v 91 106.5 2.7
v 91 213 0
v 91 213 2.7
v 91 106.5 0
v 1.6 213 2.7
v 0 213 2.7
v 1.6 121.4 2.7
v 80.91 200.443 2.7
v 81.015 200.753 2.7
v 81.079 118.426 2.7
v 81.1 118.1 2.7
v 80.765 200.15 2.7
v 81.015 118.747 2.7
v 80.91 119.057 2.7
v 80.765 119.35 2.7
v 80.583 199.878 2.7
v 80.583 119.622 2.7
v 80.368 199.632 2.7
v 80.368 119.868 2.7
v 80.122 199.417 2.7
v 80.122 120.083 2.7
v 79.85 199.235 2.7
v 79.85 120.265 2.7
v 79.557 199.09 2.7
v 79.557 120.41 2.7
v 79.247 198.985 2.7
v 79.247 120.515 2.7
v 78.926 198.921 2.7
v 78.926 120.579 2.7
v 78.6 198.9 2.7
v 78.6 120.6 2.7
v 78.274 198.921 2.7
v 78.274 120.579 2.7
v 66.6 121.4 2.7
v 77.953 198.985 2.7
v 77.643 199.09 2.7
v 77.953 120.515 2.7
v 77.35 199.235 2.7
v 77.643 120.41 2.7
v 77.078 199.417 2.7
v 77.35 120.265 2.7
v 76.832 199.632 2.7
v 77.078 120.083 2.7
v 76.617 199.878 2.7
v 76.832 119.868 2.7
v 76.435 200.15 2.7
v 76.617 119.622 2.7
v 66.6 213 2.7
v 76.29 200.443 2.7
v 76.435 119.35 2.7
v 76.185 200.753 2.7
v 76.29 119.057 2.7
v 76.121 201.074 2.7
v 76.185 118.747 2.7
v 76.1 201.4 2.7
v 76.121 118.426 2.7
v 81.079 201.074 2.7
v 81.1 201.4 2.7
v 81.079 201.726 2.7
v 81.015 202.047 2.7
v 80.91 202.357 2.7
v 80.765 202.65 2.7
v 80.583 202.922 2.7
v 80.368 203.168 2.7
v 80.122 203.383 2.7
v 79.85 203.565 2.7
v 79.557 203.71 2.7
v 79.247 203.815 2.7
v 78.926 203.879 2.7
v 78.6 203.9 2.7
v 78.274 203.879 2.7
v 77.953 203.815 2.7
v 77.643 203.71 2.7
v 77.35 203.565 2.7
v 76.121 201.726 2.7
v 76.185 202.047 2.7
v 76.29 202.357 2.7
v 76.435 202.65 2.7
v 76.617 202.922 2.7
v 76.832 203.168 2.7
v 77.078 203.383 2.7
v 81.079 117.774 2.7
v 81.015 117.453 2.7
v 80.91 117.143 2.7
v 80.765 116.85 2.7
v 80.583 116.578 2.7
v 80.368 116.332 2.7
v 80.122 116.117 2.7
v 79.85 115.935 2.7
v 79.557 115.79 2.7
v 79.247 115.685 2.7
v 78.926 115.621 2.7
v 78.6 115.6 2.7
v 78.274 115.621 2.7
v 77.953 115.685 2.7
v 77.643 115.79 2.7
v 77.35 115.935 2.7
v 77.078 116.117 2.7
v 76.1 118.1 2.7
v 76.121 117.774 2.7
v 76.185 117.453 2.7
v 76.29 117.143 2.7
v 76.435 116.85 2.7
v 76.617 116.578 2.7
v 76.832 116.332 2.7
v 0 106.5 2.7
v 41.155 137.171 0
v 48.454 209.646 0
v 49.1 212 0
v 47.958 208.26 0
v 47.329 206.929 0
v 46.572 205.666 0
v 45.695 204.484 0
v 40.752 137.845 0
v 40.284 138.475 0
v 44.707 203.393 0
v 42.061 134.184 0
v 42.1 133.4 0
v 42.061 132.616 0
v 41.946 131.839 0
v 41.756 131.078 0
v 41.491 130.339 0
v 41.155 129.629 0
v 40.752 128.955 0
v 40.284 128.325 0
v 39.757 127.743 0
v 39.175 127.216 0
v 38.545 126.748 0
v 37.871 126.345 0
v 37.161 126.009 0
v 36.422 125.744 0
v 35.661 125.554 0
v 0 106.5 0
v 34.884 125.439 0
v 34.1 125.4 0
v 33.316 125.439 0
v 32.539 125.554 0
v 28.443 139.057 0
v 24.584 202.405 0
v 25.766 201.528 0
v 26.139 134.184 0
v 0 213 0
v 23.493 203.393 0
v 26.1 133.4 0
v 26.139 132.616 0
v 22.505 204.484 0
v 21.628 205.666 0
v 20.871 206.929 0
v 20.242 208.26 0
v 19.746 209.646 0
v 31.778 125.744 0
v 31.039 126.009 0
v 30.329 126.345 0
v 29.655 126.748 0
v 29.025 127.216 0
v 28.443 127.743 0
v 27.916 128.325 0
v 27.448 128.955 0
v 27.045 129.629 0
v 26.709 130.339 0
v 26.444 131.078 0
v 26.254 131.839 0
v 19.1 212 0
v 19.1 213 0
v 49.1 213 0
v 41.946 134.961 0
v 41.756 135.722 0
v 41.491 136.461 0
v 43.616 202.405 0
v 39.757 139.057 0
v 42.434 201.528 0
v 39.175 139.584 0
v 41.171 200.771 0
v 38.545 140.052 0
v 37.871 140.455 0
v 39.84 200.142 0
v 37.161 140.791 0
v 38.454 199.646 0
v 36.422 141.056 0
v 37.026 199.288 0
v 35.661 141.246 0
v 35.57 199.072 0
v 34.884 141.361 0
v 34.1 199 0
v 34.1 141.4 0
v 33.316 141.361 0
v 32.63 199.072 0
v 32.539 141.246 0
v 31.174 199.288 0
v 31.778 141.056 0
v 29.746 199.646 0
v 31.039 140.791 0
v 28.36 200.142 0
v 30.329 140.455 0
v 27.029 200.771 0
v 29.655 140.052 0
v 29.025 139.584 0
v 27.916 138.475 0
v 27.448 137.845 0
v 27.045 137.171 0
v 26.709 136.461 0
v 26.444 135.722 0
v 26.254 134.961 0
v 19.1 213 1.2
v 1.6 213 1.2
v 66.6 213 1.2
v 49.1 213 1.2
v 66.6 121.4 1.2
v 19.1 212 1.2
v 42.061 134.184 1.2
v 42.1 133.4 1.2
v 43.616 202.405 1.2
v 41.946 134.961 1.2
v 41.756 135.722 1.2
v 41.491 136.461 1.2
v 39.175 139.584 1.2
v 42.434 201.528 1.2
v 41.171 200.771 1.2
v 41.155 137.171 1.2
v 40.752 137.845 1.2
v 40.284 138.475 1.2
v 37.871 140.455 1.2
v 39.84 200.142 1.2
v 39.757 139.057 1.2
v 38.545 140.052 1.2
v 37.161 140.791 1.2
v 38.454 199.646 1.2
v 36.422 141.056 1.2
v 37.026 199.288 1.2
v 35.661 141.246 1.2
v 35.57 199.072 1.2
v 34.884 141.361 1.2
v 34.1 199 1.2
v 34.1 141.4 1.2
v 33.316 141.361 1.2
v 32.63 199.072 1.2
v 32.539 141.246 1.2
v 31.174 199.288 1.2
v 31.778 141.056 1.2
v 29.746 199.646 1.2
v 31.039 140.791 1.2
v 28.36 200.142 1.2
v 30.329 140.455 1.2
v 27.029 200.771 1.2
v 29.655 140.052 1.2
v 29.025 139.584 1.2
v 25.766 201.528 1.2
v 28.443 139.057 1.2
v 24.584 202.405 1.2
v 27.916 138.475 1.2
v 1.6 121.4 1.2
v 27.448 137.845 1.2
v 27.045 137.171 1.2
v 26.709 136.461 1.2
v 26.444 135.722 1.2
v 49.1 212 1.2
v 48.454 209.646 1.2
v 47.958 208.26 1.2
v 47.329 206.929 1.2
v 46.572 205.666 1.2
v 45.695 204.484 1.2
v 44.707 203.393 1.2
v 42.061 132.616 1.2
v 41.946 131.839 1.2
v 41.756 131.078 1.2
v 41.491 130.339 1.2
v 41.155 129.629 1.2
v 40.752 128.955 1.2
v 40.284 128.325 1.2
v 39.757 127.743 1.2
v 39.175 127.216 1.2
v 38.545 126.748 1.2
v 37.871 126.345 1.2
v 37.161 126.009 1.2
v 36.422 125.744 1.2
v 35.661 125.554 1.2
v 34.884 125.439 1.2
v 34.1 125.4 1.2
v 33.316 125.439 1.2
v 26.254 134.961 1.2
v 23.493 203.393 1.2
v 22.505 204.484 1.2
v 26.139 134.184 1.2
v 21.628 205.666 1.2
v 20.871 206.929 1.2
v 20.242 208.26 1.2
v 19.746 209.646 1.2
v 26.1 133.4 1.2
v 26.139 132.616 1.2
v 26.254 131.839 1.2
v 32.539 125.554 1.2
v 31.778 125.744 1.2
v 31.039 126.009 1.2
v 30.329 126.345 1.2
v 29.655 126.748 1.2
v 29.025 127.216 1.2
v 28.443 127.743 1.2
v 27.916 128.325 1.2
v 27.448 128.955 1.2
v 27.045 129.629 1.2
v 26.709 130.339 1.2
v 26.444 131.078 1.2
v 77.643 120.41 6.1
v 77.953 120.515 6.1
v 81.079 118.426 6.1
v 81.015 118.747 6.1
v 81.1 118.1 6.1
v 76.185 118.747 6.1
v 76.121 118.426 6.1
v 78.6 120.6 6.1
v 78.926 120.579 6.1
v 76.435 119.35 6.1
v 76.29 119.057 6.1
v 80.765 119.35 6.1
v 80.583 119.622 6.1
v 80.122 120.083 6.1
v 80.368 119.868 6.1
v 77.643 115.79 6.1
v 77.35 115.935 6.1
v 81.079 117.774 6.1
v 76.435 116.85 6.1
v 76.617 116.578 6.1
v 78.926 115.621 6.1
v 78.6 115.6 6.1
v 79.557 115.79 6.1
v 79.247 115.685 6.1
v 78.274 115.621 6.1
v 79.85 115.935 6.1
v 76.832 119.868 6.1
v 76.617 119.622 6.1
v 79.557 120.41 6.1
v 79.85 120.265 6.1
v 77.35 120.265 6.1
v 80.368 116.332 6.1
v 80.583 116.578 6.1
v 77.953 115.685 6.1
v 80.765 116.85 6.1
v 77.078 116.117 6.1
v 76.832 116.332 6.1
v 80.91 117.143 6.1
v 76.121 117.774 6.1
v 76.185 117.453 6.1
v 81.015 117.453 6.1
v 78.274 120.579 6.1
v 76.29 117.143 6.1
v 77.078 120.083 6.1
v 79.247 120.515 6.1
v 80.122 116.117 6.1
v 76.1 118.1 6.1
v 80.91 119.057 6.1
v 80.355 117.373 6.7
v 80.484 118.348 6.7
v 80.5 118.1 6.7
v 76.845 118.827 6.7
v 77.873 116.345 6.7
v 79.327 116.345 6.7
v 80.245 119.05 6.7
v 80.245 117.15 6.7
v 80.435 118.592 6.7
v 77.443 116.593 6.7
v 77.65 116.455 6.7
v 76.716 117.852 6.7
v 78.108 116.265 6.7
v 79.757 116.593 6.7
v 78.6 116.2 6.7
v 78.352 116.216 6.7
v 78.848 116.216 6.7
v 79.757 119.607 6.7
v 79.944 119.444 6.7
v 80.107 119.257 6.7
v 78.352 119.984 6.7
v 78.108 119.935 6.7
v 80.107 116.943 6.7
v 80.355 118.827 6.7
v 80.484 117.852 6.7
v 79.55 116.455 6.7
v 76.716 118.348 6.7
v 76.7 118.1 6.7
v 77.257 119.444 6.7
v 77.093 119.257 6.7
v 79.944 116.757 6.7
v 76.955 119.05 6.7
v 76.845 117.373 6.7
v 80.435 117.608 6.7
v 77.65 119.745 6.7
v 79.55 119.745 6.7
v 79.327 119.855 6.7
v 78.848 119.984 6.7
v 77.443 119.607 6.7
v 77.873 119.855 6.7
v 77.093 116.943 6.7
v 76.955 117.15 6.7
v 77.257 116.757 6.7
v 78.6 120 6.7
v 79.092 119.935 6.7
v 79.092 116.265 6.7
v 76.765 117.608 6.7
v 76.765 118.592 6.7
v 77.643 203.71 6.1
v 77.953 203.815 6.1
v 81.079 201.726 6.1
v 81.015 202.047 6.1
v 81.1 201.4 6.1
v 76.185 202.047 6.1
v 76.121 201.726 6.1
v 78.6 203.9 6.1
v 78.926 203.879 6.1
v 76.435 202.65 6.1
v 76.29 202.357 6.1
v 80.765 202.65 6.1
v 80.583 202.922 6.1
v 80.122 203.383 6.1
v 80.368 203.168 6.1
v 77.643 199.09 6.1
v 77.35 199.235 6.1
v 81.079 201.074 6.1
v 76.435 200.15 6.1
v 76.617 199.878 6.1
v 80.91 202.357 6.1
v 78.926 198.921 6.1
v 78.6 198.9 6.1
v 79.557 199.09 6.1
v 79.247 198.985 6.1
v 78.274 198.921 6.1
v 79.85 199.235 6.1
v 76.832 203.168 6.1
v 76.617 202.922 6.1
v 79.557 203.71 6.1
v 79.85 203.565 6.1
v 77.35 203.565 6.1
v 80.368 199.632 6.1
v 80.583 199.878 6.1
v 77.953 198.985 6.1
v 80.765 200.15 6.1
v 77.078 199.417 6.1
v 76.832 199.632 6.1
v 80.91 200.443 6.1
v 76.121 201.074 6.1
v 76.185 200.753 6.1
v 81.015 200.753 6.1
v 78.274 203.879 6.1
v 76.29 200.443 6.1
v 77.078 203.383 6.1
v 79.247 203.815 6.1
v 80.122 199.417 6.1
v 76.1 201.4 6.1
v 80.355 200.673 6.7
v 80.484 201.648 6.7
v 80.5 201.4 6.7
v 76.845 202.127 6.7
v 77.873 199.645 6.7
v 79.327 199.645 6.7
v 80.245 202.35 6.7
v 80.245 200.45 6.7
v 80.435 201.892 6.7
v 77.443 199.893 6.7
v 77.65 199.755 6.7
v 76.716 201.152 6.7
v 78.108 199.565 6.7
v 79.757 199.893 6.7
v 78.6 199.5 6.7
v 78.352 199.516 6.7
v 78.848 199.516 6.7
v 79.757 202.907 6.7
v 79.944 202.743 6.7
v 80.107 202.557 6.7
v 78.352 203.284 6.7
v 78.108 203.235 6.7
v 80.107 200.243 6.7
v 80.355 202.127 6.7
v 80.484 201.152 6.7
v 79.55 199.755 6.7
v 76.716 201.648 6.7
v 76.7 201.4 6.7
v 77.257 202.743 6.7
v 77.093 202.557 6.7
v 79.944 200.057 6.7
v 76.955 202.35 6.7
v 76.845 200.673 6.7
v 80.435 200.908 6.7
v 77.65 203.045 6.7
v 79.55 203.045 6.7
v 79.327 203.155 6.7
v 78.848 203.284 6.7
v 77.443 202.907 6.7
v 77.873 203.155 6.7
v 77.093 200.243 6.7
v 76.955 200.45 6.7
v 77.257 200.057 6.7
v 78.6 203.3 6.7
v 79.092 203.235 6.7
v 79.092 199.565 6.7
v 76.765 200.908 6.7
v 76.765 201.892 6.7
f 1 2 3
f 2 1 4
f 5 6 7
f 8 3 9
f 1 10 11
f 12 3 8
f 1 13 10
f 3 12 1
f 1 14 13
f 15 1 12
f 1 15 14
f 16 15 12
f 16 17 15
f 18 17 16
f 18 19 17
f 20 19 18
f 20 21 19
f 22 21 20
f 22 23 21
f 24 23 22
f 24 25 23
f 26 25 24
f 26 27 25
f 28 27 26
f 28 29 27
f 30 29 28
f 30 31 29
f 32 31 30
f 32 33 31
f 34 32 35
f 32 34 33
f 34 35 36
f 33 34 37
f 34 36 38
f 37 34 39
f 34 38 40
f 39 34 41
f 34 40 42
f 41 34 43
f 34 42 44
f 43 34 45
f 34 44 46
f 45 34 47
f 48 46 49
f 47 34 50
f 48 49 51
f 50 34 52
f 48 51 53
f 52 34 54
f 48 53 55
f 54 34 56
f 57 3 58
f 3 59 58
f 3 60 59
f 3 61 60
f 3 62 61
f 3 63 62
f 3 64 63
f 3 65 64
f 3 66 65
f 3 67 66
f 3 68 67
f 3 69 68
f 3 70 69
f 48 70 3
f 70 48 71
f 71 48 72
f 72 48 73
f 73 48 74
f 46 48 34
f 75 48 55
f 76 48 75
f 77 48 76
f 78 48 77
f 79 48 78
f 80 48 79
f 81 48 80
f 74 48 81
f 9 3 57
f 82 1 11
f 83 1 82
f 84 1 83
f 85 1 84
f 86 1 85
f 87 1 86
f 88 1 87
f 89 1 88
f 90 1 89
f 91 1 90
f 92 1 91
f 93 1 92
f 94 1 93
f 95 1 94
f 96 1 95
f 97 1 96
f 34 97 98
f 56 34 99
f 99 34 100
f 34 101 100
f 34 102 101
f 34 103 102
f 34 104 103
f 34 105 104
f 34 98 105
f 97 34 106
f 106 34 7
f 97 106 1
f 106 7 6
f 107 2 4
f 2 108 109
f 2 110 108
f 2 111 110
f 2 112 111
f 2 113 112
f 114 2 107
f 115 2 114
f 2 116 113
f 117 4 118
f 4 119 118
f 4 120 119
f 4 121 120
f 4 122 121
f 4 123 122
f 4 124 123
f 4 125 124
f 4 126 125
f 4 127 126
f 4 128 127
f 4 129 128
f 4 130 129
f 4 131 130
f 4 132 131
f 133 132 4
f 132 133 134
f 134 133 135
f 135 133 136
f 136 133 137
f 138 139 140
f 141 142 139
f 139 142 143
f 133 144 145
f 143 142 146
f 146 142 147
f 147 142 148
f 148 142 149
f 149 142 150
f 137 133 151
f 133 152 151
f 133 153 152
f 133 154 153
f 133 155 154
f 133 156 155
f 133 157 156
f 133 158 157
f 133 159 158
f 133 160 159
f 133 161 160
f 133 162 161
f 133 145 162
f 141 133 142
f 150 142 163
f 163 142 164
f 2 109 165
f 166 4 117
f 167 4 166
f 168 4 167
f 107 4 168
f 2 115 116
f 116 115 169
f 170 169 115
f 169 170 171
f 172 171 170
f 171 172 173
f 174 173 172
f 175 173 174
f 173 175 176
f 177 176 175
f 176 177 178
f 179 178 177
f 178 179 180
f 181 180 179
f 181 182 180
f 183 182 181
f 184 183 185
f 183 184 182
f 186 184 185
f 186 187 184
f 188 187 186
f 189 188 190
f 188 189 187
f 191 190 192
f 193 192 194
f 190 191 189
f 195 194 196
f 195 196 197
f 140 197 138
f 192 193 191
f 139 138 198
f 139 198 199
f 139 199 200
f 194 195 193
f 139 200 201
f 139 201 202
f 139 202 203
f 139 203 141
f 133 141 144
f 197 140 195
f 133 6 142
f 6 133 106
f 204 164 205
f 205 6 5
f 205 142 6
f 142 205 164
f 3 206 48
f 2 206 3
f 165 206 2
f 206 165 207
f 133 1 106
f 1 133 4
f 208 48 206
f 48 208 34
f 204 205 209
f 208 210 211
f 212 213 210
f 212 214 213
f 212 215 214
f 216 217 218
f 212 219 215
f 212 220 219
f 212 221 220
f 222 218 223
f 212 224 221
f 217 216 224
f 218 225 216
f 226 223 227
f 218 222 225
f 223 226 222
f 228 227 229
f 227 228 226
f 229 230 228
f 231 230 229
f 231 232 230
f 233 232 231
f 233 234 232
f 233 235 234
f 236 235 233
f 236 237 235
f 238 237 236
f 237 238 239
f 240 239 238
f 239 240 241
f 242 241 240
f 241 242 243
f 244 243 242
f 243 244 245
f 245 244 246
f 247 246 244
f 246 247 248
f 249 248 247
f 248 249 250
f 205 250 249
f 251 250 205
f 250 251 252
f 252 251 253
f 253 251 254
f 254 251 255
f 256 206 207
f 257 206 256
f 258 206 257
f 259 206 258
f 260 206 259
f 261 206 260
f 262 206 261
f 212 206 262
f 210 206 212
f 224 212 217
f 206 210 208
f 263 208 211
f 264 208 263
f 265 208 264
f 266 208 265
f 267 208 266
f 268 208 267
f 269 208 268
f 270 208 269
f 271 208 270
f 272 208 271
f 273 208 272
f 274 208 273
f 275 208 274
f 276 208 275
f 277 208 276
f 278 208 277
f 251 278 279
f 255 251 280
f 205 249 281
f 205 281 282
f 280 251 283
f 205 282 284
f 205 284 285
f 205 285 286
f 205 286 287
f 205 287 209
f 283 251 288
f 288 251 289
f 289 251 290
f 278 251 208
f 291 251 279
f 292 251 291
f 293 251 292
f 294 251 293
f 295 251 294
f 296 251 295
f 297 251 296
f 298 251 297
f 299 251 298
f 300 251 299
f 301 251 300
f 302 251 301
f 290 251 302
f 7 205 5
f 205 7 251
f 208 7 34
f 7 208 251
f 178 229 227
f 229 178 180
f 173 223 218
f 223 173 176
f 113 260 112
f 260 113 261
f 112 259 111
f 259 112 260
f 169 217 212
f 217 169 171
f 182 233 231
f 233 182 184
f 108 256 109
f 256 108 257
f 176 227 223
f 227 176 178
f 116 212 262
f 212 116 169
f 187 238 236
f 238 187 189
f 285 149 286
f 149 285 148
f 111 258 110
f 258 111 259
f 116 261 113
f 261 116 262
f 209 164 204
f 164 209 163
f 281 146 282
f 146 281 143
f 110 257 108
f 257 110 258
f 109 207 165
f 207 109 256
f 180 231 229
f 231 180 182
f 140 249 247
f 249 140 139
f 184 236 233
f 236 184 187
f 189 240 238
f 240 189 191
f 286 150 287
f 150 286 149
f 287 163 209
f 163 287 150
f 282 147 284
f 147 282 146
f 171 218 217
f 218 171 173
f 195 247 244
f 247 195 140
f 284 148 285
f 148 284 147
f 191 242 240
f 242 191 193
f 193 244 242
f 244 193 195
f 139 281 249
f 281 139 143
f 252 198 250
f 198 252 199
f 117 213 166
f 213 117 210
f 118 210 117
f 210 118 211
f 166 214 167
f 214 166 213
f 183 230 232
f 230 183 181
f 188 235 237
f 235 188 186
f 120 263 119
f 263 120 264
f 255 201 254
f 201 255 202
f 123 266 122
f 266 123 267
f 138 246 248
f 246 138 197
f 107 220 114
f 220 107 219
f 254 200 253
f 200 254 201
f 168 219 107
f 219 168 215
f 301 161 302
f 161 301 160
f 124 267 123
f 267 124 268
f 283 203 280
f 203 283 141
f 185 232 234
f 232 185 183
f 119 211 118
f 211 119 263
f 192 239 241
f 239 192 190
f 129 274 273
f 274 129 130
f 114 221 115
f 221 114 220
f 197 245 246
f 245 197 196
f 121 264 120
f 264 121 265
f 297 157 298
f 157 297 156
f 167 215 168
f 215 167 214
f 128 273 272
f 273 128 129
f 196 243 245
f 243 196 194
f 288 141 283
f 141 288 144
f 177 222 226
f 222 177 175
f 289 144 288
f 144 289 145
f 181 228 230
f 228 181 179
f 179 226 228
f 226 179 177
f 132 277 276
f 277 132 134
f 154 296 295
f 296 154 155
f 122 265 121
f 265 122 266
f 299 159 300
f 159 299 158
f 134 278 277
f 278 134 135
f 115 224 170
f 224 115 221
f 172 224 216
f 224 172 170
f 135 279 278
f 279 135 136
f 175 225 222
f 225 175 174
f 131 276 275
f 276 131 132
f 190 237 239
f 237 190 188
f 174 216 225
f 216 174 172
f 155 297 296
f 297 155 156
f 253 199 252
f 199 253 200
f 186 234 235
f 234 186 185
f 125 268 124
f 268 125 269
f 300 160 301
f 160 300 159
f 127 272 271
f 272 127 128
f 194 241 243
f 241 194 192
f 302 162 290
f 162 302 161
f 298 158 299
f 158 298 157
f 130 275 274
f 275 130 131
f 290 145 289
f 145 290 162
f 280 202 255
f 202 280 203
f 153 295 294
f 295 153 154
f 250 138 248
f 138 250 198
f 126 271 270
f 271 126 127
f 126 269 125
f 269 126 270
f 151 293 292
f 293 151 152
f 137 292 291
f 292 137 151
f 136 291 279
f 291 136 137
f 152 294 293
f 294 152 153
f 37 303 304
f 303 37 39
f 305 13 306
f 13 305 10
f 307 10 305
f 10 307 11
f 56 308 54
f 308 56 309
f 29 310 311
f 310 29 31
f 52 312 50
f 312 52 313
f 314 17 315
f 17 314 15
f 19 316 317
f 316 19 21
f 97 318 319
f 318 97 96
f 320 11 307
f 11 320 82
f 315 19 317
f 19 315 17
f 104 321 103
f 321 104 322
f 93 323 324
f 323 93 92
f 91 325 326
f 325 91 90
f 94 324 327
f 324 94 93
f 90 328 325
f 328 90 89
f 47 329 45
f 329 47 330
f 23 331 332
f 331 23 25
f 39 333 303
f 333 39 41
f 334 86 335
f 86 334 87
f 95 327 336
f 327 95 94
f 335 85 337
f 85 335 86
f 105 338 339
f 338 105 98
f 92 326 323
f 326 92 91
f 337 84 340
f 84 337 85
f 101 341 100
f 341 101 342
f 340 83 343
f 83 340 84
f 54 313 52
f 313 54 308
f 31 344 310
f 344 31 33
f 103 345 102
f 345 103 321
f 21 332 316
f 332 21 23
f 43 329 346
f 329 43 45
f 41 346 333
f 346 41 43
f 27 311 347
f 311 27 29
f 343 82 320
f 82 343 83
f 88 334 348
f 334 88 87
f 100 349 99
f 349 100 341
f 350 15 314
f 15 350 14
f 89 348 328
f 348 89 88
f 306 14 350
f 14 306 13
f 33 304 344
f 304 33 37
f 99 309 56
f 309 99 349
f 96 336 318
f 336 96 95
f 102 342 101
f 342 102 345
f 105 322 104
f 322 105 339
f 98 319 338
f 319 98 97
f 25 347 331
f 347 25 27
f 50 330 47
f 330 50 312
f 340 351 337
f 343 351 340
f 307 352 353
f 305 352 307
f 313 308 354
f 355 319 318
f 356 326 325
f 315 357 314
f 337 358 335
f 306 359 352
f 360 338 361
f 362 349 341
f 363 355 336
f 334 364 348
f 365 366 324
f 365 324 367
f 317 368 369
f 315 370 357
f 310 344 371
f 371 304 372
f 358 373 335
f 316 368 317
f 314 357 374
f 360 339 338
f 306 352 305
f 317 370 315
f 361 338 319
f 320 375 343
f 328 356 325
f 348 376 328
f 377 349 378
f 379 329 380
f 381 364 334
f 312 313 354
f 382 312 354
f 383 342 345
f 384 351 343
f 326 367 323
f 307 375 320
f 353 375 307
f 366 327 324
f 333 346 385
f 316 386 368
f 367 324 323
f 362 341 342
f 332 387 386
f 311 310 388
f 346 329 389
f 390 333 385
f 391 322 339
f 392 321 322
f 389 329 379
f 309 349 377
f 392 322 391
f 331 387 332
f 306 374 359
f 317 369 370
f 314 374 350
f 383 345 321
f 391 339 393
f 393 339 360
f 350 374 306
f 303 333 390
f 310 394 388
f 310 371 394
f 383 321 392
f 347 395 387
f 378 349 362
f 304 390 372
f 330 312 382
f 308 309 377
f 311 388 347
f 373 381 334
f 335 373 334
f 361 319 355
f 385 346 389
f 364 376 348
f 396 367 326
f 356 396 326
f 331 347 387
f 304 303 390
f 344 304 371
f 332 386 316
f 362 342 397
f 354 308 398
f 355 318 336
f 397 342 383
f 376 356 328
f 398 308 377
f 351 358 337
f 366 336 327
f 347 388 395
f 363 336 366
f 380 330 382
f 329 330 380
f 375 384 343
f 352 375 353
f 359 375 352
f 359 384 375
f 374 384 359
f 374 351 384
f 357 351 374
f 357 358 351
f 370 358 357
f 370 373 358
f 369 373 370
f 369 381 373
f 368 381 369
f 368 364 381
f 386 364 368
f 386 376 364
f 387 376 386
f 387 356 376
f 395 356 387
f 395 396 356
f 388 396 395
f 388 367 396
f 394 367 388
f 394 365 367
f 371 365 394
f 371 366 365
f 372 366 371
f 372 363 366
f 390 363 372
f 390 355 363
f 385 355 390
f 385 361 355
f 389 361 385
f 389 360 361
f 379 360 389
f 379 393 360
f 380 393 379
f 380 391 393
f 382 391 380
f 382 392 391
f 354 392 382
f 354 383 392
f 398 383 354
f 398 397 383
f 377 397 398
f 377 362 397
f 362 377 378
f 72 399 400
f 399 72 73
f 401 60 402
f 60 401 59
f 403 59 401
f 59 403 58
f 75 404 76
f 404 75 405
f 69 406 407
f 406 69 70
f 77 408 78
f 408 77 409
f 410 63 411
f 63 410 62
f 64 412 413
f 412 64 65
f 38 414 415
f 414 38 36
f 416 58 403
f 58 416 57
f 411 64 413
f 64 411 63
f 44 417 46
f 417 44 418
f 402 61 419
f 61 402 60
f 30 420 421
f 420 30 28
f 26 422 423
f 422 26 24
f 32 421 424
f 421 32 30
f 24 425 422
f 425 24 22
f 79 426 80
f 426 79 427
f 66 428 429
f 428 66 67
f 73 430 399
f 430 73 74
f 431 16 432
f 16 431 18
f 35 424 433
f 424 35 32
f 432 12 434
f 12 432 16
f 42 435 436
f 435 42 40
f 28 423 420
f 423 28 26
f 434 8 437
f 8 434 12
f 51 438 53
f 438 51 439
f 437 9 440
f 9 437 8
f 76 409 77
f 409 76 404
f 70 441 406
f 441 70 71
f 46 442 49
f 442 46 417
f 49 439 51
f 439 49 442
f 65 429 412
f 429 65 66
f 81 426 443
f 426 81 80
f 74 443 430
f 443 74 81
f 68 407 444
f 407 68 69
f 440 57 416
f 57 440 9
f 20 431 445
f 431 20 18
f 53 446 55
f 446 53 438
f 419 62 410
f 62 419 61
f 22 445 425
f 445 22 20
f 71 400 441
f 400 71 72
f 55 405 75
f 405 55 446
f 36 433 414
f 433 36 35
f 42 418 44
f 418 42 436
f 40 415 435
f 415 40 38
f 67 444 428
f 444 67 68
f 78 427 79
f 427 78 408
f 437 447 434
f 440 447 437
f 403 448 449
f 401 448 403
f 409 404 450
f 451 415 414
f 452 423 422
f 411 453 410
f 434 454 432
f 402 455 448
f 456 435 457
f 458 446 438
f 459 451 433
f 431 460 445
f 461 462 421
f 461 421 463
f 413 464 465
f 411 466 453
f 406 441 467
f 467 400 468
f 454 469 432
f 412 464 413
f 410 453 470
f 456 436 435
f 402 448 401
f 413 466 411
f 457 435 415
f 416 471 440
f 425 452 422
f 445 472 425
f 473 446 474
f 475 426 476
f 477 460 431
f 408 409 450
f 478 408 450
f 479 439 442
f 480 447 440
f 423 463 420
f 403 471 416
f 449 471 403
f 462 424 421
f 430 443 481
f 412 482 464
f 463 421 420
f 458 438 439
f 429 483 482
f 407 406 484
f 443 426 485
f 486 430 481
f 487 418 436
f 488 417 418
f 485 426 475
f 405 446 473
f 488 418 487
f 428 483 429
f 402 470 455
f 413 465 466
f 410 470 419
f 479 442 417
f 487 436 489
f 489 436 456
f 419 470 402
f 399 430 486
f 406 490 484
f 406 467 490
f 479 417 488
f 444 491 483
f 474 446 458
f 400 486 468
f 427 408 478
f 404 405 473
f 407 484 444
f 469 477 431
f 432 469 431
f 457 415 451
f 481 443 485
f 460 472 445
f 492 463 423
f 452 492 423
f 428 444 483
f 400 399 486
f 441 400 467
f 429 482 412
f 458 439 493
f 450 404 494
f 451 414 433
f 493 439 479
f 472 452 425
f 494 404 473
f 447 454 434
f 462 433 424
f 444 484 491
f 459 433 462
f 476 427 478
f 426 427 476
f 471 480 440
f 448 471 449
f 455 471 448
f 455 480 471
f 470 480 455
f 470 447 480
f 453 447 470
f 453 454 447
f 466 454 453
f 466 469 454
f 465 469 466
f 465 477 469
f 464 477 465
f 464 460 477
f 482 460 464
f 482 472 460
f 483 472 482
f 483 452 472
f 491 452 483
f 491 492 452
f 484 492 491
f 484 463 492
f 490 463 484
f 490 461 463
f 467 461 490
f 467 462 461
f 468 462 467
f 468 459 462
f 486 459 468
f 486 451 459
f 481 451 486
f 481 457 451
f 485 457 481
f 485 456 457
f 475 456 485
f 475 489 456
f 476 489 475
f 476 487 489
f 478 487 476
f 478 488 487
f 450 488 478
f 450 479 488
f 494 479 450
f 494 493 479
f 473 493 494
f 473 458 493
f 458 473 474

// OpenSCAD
// file: ../lib/faction-layout.scad
// Shared layout for the faction box and its contents: token pockets, card slot, shelf.
include <../constants.scad>

function sum(v, i = 0) = i >= len(v) ? 0 : v[i] + sum(v, i + 1);
function token_size(t) = t[0] == "round" ? round_token_d : square_tile;

// Pockets along the token column, from the back wall forward: [[y_start, length], ...].
// Spare column length is shared out as clearance, up to token_pocket_clr_max per pocket;
// anything left over becomes a spare compartment at the front.
function token_pockets(f) =
    let (
        toks = faction_tokens(f),
        n = len(toks),
        sizes = [for (t = toks) token_size(t)],
        free = column_l - sum(sizes) - (n - 1) * divider_t,
        extra = min(free / n, token_pocket_clr_max),
        lens = [for (s = sizes) s + extra],
        ends = [for (i = [0 : n - 1]) faction_box_d - wall - (i == 0 ? 0 : sum([for (j = [0 : i - 1]) lens[j]]) + i * divider_t)]
    )
    assert(free >= 0, str(f, ": token stacks don't fit in the column"))
    [for (i = [0 : n - 1]) [ends[i] - lens[i], lens[i]]];

function spare_length(f) =
    let (p = token_pockets(f), last = p[len(p) - 1])
    last[0] - divider_t - wall;

// The box is two open cups glued together: the base (card slot) and the top (warriors + tokens).
function slot_height(f) = faction_cards_h(f) + slot_headroom;
function base_h(f) = floor_t + slot_height(f);       // base height = where the top piece starts
function top_floor_z(f) = base_h(f) + floor_t;       // floor of the warrior bin

// Pocket floor height: the stack's top ends token_headroom below the rim.
function pocket_floor_z(f, t) = max(top_floor_z(f), faction_box_h - t[1] * token_t - token_headroom);

// Alignment pins: in the token column, near the front and back walls. On the base they stand
// on its flat top; in the top piece the holes go up into posts inside the pocket hollows.
function pin_positions() = [
    [column_x + column_w / 2, wall + pin_inset],
    [column_x + column_w / 2, faction_box_d - wall - pin_inset],
];
function boss_d() = pin_d + pin_fit + 2 * boss_wall;
function boss_top(f) = base_h(f) + pin_h + pin_hole_extra + floor_t;   // hole depth + a 1.2 mm cap

// Each pin's post must fit under the raised floor of the pocket above it (or in the open spare compartment).
function pin_post_fits(f) =
    let (toks = faction_tokens(f), p = token_pockets(f))
    [for (pos = pin_positions())
        let (hits = [for (i = [0 : len(p) - 1]) if (pos[1] >= p[i][0] && pos[1] <= p[i][0] + p[i][1]) i])
        len(hits) == 0 || boss_top(f) <= pocket_floor_z(f, toks[hits[0]]) - pocket_floor_t];
// file: ../constants.scad
// Root (base game) insert. All sizes in mm; see README.md for where the numbers come from.
// Coordinates: x along the box's long side (279), y toward the back of the box, z up.

eps = 0.01;

// ---- Box (measured) ----
box_inner_w = 279;      // cavity, long side
box_inner_d = 216;      // cavity, short side
box_inner_h = 71;       // lower box, floor to wall top
board_stack_h = 24;     // map + 4 faction boards + Law of Root + sheet + Learning to Play
lid_clearance = 1;      // so the box lid closes without pressing

// ---- Insert envelope ----
insert_w = 276;
insert_d = 213;
insert_h = box_inner_h - board_stack_h - lid_clearance;   // 46

// ---- Components (measured) ----
card_w = 63;
card_l = 88;
card_t = 0.35;          // per card (54-card deck = 19 mm)
square_tile = 17.6;     // buildings, roosts, bases, ruins, items, score, relationship
round_token_d = 19.2;   // wood, keep, sympathy
token_t = 2;
warrior_t = 8.9;        // all warriors and the pawn are ~8.9 thick

// Faction card stacks (walkthrough/reference/faction cards)
marquise_cards_h = 0.7;
eyrie_cards_h = 3.8;
alliance_cards_h = 0.7;
vagabond_cards_h = 8.2;

// ---- Tray construction ----
wall = 1.6;
floor_t = 1.2;
divider_t = 1.2;
card_clr = 1;            // around the cards, each side
slot_headroom = 0.8;     // above the card stack in the side-loading slot
token_pocket_clr_max = 3;   // pockets get the column's spare length, up to this much extra
token_headroom = 1;      // token stacks stop this far below the rim (the board stack caps the trays)
pocket_floor_t = 1.2;    // raised pocket floor; hollow underneath
finger_notch_w = 14;     // notch in the outer wall beside each token pocket
finger_notch_keep = 2;   // wall left above the pocket floor (holds the bottom token)
card_push_hole_d = 16;   // under the closed end of the card slot: push the cards out

// ---- Base-to-top joint: two pins on the base, two holes in the top (press fit, tune by test print) ----
pin_d = 5;
pin_h = 4;
pin_chamfer = 0.6;       // lead-in on the pin tip
pin_fit = 0.15;          // hole diameter over pin diameter (FDM holes print a little small)
pin_hole_extra = 0.4;    // hole deeper than the pin, so the faces seat flush
pin_hole_chamfer = 0.4;  // at the hole mouth (bed side): room for elephant's foot
pin_inset = 10;          // pin centres from the inside of the front/back walls
boss_wall = 1.6;         // around each hole, inside the top piece's token-column hollows
pinch_notch_w = 30;      // U-notch in the floor at the card slot opening
pinch_notch_l = 14;

// No lids: in the box, the board stack lies across every tray within ~1 mm of the tops,
// which is too small a gap for a 2 mm token or a warrior.

// ---- Faction box (all four share one size) ----
faction_box_w = 91;
faction_box_d = 106.5;
faction_box_h = insert_h;                    // 46
card_slot_w = card_w + 2 * card_clr;         // 65
card_slot_l = card_l + 2 * card_clr;         // 90
bin_w = card_slot_w;                         // warrior bin sits on the shelf, same width as the cards
column_x = wall + bin_w + divider_t;         // token column starts here
column_w = faction_box_w - column_x - wall;  // 21.6
column_l = faction_box_d - 2 * wall;         // 103.3

// ---- Per-faction data ----
factions = ["marquise", "eyrie", "alliance", "vagabond"];

function faction_name(f) =
    f == "marquise" ? "MARQUISE" : f == "eyrie" ? "EYRIE" : f == "alliance" ? "ALLIANCE" : "VAGABOND";

function faction_color(f) =
    f == "marquise" ? "#d9782d" : f == "eyrie" ? "#3d6fb4" : f == "alliance" ? "#4e9a48" : "#8b8f88";

function faction_cards_h(f) =
    f == "marquise" ? marquise_cards_h : f == "eyrie" ? eyrie_cards_h
    : f == "alliance" ? alliance_cards_h : vagabond_cards_h;

// Token stacks in the column, listed from the back of the box forward: [shape, count]
function faction_tokens(f) =
    f == "marquise" ? [["round", 8], ["round", 1], ["square", 6], ["square", 6], ["square", 6]]   // wood, keep, sawmills, workshops, recruiters
    : f == "eyrie" ? [["square", 7]]                                                              // roosts
    : f == "alliance" ? [["round", 10], ["square", 3]]                                           // sympathy, bases
    : [["square", 3]];                                                                           // relationship markers

// Where each box sits in the insert (2 x 2 block on the left; shared trays on the right)
function faction_pos(f) =
    f == "marquise" ? [0, insert_d - faction_box_d, 0]
    : f == "eyrie" ? [faction_box_w, insert_d - faction_box_d, 0]
    : f == "alliance" ? [0, 0, 0]
    : [faction_box_w, 0, 0];
// main file
// Faction box, bottom piece: the card slot. Solid apart from the slot, so its whole top is a flat
// face against the top piece (faction-top.scad), with two alignment pins that press into holes in it.
// The slot is open at the back so the faction cards slide in and out sideways; the top piece's
// smooth bed-side floor is the slot's ceiling, so nothing bridges. Prints upright, no overhangs.
// Render one with:  openscad -D 'faction="eyrie"' -o eyrie-base.stl faction-base.scad
include <../constants.scad>
use <../lib/faction-layout.scad>

faction = "marquise";
in_layout = true;   // place at its position in the insert (false: at the origin)

module faction_base(f) {
    w = faction_box_w;
    d = faction_box_d;
    h = base_h(f);
    slot_y = d - wall - card_slot_l;
    cx = wall + card_slot_w / 2;

    difference() {
        cube([w, d, h]);

        // card slot, open through the back wall
        translate([wall, slot_y, floor_t]) cube([card_slot_w, card_slot_l + wall + 1, h]);

        // pinch notch through the floor at the slot opening
        translate([0, 0, -1]) hull() {
            translate([cx, d - pinch_notch_l + pinch_notch_w / 2, 0]) cylinder(d = pinch_notch_w, h = floor_t + 2, $fn = 64);
            translate([cx - pinch_notch_w / 2, d - 1, 0]) cube([pinch_notch_w, 2, floor_t + 2]);
        }

        // push hole under the closed end of the slot
        translate([cx, slot_y + card_push_hole_d / 2 + 4, -1]) cylinder(d = card_push_hole_d, h = floor_t + 2, $fn = 64);
    }

    // alignment pins, chamfered at the tip
    for (p = pin_positions()) translate([p[0], p[1], h - eps]) {
        cylinder(d = pin_d, h = pin_h - pin_chamfer + eps, $fn = 48);
        translate([0, 0, pin_h - pin_chamfer + eps]) cylinder(d1 = pin_d, d2 = pin_d - 2 * pin_chamfer, h = pin_chamfer, $fn = 48);
    }
}

translate(in_layout ? faction_pos(faction) : [0, 0, 0])
    color(faction_color(faction)) faction_base(faction);
